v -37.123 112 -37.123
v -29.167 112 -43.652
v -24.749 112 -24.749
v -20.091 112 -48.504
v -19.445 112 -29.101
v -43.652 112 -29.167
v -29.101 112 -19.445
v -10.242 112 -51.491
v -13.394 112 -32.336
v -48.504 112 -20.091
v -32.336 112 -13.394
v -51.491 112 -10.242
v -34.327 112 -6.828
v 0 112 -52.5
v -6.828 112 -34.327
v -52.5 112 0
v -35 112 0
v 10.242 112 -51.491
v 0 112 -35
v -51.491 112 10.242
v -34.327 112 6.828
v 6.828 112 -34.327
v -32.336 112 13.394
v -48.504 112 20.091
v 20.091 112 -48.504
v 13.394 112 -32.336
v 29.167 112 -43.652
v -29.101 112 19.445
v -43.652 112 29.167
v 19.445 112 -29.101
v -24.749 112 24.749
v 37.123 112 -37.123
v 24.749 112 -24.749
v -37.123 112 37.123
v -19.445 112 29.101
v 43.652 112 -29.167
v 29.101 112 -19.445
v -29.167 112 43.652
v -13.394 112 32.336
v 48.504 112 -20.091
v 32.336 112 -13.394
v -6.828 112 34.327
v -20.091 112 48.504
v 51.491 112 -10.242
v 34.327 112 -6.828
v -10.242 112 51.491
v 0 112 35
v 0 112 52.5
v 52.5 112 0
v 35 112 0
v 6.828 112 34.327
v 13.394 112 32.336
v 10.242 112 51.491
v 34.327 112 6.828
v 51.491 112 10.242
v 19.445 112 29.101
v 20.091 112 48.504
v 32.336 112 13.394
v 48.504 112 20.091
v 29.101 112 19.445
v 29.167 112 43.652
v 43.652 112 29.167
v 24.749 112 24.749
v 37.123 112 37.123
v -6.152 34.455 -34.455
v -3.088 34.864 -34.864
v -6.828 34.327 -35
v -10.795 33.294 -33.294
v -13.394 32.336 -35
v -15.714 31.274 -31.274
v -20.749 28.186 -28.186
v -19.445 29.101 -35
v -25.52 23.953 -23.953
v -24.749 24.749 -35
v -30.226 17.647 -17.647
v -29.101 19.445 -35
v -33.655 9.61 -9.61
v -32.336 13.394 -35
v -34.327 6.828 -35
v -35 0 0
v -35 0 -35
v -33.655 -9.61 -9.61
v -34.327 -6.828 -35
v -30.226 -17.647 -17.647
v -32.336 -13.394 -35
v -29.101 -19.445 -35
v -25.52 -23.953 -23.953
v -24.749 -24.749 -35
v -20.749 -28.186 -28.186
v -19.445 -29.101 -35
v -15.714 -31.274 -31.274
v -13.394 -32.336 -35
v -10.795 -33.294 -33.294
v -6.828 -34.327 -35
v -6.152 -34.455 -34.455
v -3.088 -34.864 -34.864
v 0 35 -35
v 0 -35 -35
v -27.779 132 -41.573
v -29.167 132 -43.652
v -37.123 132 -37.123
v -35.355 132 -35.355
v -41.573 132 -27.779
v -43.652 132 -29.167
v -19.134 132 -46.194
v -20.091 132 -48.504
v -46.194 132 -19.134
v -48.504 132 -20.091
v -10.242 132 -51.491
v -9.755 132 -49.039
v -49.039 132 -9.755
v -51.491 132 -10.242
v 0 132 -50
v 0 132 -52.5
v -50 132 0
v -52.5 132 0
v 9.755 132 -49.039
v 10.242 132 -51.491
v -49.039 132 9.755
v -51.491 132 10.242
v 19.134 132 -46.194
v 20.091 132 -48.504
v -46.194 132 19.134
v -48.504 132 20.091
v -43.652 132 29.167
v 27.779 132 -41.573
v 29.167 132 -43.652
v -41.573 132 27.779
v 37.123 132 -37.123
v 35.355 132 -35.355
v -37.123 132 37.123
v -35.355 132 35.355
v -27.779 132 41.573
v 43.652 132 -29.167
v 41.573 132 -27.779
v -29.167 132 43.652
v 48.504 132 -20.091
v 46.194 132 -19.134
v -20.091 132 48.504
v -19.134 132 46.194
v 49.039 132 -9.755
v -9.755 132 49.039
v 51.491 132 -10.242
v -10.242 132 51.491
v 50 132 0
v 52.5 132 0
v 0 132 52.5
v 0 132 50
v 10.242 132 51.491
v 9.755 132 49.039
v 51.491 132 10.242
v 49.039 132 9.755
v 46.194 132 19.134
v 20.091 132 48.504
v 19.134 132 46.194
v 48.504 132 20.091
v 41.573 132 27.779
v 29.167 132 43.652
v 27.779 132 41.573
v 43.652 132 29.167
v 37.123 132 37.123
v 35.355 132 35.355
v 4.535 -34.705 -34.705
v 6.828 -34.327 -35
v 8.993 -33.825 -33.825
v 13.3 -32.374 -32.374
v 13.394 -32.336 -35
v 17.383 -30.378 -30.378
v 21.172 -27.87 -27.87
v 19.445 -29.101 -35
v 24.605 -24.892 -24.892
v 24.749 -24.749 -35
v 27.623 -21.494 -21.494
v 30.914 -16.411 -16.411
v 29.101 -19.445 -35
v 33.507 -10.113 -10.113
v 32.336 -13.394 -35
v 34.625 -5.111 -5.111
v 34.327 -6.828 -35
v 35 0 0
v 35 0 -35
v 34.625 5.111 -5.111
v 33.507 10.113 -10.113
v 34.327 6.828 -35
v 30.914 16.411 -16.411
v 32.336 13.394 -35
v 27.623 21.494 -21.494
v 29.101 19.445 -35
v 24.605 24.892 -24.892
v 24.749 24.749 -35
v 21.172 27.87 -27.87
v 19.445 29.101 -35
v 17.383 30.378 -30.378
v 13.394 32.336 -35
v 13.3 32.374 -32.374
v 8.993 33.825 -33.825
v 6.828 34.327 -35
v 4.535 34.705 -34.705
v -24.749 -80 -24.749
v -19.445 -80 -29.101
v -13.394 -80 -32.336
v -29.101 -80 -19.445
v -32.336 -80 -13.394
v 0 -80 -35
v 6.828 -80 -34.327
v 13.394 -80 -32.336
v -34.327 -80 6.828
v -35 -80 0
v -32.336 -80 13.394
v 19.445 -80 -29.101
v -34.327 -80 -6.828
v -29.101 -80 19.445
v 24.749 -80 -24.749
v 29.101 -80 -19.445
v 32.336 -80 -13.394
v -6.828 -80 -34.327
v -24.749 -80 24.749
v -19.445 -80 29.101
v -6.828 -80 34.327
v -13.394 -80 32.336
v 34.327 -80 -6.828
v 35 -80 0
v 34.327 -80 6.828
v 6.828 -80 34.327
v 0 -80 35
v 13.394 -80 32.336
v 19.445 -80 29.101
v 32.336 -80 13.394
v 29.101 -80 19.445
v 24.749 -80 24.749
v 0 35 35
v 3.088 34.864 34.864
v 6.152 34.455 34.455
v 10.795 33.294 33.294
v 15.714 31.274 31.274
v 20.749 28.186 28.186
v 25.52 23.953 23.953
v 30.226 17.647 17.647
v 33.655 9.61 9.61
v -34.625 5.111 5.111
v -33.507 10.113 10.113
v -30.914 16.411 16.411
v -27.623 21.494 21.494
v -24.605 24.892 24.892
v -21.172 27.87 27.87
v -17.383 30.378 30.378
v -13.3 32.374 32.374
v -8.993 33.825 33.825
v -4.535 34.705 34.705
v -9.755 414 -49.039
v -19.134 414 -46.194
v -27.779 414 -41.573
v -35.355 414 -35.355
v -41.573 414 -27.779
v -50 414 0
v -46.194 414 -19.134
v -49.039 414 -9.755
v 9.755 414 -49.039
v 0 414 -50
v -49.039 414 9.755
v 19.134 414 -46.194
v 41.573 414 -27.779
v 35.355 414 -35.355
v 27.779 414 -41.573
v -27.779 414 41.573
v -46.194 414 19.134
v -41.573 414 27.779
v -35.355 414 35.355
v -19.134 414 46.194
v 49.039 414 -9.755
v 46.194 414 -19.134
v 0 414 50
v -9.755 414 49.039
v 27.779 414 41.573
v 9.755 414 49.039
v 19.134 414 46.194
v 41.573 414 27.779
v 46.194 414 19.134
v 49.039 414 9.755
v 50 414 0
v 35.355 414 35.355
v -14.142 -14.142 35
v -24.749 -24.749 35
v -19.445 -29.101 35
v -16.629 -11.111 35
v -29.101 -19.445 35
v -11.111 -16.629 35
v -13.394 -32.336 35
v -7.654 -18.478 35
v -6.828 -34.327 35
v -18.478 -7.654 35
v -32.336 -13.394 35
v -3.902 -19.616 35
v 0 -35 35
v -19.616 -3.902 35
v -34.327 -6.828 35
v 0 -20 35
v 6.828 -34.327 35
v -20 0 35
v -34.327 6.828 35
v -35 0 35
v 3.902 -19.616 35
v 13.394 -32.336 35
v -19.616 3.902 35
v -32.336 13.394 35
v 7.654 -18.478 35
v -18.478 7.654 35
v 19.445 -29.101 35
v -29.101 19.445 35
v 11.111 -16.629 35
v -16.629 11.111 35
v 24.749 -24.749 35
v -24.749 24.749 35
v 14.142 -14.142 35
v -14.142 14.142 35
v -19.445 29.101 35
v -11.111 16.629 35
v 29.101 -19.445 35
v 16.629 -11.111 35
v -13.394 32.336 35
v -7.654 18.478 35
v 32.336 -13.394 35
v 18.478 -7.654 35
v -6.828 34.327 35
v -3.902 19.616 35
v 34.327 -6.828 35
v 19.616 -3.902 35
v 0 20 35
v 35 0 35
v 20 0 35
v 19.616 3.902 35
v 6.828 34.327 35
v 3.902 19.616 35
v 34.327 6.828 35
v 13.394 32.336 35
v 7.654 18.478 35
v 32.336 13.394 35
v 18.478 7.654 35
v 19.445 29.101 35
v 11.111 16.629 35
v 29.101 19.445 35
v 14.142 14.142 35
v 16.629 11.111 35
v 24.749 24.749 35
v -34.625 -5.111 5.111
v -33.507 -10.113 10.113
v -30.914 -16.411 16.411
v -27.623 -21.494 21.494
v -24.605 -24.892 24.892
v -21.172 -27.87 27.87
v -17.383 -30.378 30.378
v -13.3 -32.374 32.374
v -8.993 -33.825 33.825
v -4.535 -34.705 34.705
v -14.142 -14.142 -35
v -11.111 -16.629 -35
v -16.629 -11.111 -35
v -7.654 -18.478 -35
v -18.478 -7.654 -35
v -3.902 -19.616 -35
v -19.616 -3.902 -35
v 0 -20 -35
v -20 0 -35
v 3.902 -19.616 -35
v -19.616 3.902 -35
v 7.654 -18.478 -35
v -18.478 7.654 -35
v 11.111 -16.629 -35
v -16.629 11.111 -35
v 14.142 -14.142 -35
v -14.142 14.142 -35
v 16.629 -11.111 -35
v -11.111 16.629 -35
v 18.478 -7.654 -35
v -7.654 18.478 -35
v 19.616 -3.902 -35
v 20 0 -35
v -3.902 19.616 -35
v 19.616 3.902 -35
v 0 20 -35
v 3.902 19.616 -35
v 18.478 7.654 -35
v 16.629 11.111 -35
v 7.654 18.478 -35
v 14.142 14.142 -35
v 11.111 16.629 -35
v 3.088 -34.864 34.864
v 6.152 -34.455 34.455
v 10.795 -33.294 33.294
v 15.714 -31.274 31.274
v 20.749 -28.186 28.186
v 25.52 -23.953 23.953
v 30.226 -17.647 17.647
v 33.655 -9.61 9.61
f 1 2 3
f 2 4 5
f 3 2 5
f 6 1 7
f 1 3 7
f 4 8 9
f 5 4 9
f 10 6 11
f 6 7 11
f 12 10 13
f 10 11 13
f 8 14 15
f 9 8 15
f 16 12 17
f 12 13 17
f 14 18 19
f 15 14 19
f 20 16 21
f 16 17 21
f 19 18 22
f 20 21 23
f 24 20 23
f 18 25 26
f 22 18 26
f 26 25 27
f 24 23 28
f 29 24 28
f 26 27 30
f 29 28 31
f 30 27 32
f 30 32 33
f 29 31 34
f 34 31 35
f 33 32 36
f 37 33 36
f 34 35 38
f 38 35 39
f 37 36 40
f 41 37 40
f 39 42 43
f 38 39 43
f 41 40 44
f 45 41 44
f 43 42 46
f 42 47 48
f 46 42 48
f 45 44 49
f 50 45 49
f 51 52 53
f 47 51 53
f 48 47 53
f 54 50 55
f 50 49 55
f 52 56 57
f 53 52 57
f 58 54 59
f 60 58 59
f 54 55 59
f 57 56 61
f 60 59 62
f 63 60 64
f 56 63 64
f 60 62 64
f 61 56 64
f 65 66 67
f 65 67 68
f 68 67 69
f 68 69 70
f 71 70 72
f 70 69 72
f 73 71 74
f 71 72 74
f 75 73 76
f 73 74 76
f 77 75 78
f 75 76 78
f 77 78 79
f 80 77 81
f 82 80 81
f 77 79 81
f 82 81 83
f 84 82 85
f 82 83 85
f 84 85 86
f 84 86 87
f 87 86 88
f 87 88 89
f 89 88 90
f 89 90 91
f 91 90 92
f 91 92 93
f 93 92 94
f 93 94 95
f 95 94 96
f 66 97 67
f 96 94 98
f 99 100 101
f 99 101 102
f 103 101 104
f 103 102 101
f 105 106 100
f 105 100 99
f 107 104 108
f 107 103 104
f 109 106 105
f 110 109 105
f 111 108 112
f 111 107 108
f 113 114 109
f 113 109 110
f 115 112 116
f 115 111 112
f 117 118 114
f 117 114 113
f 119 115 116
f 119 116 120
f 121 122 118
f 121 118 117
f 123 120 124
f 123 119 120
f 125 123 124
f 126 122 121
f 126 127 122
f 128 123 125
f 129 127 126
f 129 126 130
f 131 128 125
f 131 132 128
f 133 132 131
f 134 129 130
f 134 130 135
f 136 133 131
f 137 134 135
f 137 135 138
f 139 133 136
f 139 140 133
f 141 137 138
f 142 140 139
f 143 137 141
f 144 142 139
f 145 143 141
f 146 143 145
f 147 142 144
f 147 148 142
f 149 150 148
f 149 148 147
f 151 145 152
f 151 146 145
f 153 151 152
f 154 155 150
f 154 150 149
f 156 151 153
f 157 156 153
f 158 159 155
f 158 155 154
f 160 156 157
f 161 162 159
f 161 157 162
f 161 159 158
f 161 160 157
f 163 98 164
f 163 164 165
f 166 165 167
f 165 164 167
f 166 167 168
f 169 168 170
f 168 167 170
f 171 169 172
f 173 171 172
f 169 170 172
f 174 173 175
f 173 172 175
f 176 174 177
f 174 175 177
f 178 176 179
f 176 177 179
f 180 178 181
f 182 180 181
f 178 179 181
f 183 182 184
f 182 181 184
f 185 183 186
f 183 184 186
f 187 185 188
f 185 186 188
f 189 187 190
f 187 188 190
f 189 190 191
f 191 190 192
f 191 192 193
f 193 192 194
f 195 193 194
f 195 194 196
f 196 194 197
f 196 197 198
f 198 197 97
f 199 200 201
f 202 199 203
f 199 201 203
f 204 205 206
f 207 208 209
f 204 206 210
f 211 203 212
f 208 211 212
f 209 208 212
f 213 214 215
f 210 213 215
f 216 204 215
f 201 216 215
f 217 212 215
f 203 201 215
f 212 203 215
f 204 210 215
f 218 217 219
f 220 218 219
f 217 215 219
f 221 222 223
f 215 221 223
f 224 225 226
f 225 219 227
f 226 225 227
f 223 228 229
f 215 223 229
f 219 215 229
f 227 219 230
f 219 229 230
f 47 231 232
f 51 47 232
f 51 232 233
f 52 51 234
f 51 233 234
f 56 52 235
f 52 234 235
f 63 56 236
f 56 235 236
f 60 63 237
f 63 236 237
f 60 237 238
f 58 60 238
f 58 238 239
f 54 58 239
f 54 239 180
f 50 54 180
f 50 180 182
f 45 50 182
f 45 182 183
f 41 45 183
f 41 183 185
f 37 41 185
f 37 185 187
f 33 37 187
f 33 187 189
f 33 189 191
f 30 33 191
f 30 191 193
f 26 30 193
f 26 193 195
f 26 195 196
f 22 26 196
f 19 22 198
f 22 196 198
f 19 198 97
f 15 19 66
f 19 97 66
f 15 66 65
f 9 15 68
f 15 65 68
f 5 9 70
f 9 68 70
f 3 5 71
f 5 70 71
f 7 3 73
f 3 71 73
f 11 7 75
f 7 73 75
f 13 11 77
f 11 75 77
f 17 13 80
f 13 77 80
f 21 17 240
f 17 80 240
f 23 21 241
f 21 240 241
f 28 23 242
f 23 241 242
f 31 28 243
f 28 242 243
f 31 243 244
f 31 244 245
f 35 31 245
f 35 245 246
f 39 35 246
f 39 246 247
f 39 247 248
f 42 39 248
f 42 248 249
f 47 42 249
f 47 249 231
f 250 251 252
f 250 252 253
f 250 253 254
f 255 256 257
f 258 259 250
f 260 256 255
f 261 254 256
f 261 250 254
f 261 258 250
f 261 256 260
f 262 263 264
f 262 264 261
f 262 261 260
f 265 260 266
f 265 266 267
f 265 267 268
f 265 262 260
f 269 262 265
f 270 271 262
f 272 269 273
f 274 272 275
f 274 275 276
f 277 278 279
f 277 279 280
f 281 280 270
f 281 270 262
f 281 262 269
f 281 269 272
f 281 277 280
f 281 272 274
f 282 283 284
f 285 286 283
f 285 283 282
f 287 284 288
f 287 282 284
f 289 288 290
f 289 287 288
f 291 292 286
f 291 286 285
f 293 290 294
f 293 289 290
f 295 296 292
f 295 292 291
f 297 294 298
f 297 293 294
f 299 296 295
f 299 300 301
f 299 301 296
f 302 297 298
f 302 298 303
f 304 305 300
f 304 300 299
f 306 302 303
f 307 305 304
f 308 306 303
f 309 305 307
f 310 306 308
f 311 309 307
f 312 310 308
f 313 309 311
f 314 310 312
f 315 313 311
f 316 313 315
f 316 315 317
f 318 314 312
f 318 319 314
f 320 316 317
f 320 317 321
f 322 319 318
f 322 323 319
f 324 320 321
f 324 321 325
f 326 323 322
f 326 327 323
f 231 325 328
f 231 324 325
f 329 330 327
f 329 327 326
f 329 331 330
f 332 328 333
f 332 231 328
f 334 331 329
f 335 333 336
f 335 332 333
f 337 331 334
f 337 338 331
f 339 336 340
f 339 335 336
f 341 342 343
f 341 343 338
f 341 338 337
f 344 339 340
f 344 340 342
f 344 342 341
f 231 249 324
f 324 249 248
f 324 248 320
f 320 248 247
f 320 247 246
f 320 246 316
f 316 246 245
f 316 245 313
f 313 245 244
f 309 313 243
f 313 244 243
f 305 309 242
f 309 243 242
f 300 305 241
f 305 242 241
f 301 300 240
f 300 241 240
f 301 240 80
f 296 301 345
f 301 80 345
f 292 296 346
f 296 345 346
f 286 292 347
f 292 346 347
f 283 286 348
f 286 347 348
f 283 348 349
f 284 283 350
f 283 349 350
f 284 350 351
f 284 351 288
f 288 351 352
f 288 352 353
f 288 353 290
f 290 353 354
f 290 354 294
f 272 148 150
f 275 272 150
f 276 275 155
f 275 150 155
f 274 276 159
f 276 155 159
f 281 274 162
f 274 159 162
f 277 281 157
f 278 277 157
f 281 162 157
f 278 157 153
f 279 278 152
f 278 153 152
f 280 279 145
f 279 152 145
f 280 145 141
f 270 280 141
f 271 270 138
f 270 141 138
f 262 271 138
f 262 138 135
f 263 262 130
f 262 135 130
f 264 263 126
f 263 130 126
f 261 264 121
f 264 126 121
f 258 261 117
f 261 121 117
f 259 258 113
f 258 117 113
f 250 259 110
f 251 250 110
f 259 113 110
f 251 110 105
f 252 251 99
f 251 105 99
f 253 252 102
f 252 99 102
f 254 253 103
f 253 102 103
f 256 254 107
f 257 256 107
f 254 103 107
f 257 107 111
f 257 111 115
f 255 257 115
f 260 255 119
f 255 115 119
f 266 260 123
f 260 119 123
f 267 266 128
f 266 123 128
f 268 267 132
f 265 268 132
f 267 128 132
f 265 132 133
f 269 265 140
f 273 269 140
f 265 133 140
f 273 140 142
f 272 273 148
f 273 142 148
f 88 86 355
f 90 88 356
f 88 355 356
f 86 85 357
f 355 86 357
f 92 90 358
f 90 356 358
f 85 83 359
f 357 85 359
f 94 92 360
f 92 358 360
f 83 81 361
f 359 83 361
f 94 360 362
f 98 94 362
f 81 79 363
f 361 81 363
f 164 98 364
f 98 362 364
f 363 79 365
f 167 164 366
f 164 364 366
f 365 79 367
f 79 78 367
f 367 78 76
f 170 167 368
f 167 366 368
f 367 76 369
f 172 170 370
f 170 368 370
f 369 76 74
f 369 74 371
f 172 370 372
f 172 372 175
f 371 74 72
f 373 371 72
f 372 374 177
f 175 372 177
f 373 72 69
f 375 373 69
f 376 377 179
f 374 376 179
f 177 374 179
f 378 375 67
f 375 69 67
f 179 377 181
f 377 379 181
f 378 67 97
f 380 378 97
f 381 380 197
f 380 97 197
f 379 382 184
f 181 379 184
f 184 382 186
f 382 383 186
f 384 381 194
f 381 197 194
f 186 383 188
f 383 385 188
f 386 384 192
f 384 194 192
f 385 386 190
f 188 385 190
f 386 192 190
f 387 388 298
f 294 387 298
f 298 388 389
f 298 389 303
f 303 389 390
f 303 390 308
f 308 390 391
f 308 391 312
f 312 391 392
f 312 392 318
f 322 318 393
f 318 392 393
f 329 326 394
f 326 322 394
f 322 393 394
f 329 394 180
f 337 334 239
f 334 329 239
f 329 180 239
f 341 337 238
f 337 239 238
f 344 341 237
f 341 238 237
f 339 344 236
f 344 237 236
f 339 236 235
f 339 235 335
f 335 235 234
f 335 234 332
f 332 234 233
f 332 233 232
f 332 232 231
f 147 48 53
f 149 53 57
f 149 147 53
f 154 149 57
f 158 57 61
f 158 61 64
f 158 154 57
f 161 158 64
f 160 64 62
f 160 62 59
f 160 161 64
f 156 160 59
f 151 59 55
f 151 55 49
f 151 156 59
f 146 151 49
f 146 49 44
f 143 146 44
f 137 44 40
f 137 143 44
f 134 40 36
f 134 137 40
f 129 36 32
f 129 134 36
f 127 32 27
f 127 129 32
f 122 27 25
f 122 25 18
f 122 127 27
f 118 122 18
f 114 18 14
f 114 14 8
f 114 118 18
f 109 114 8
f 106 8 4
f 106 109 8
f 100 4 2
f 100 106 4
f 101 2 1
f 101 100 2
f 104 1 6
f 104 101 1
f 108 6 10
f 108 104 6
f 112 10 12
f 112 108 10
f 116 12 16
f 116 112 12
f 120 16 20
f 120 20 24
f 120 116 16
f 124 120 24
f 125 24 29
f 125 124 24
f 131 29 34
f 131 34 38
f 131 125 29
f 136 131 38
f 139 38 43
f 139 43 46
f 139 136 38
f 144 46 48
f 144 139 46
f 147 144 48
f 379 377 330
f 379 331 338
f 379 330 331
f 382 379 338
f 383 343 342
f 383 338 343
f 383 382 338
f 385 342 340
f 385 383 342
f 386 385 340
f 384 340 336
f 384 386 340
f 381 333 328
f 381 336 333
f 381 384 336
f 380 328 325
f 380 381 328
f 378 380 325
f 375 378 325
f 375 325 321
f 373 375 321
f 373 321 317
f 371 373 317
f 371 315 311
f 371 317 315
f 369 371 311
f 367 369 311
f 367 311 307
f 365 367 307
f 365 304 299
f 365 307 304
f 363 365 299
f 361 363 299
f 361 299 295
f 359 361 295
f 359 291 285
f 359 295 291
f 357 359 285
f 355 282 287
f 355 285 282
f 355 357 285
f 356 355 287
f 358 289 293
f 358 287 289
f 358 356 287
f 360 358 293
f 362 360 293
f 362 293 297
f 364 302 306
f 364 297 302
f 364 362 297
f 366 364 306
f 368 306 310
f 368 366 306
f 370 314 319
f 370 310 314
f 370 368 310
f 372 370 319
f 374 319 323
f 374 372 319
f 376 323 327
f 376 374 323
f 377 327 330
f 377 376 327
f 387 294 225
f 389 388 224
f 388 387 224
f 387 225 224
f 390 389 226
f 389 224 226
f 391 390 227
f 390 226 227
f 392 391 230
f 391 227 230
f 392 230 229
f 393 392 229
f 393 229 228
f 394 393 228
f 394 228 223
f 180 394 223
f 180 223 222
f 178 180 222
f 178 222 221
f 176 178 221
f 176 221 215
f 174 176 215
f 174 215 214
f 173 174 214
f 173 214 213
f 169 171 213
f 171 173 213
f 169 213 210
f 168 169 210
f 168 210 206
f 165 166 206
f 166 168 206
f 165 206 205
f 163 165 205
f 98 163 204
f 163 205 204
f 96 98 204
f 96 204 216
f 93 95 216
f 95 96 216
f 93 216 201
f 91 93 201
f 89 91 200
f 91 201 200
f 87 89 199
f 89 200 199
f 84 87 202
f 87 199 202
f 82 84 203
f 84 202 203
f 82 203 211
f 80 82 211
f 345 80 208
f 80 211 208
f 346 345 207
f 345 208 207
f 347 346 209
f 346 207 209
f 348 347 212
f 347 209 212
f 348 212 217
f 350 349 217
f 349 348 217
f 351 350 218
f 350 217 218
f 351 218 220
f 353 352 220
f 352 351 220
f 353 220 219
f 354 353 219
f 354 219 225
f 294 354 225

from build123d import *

# Parameters (mm, degrees)
BOSS_EXTRUDE1_DEPTH      = 132
BOSS_EXTRUDE1_DEPTH_BACK = 80
SKETCH1_R                = 35
BOSS_EXTRUDE2_DEPTH      = 35
BOSS_EXTRUDE2_DEPTH_BACK = 35
SKETCH2_R                = 35
SKETCH3_R                = 52.5
BOSS_EXTRUDE3_DEPTH      = 20
SKETCH4_R                = 50
BOSS_EXTRUDE4_DEPTH      = 282
CUT_EXTRUDE1_DEPTH       = 427.390079622
CUT_EXTRUDE1_DEPTH_BACK  = 427.390079622
SKETCH5_R                = 20


with BuildPart() as part:
    # Sketch1 → Boss-Extrude1 (new, two sides: drawn at the far end of the back side and taken through both)
    with BuildSketch(Plane(origin=(0, 0, 0), x_dir=(1, 0, 0), z_dir=(0, 1, 0)).offset(-BOSS_EXTRUDE1_DEPTH_BACK)):
        Circle(SKETCH1_R)
    extrude(amount=BOSS_EXTRUDE1_DEPTH + BOSS_EXTRUDE1_DEPTH_BACK)

    # Sketch2 → Boss-Extrude2 (add, two sides: drawn at the far end of the back side and taken through both)
    with BuildSketch(Plane.XY.offset(-BOSS_EXTRUDE2_DEPTH_BACK)):
        Circle(SKETCH2_R)
    extrude(amount=BOSS_EXTRUDE2_DEPTH + BOSS_EXTRUDE2_DEPTH_BACK)

    # Sketch3 → Boss-Extrude3 (add)
    with BuildSketch(Plane(origin=(0, 132, 0), x_dir=(1, 0, 0), z_dir=(0, 1, 0))):
        Circle(SKETCH3_R)
    extrude(amount=-BOSS_EXTRUDE3_DEPTH)

    # Sketch4 → Boss-Extrude4 (add)
    with BuildSketch(Plane(origin=(0, 132, 0), x_dir=(1, 0, 0), z_dir=(0, 1, 0))):
        Circle(SKETCH4_R)
    extrude(amount=BOSS_EXTRUDE4_DEPTH)

    # Sketch5 → Cut-Extrude1 (cut, two sides: drawn at the far end of the back side and taken through both)
    with BuildSketch(Plane.XY.offset(35).offset(-CUT_EXTRUDE1_DEPTH_BACK)):
        Circle(SKETCH5_R)
    extrude(amount=CUT_EXTRUDE1_DEPTH + CUT_EXTRUDE1_DEPTH_BACK, mode=Mode.SUBTRACT)


solid = part.part
